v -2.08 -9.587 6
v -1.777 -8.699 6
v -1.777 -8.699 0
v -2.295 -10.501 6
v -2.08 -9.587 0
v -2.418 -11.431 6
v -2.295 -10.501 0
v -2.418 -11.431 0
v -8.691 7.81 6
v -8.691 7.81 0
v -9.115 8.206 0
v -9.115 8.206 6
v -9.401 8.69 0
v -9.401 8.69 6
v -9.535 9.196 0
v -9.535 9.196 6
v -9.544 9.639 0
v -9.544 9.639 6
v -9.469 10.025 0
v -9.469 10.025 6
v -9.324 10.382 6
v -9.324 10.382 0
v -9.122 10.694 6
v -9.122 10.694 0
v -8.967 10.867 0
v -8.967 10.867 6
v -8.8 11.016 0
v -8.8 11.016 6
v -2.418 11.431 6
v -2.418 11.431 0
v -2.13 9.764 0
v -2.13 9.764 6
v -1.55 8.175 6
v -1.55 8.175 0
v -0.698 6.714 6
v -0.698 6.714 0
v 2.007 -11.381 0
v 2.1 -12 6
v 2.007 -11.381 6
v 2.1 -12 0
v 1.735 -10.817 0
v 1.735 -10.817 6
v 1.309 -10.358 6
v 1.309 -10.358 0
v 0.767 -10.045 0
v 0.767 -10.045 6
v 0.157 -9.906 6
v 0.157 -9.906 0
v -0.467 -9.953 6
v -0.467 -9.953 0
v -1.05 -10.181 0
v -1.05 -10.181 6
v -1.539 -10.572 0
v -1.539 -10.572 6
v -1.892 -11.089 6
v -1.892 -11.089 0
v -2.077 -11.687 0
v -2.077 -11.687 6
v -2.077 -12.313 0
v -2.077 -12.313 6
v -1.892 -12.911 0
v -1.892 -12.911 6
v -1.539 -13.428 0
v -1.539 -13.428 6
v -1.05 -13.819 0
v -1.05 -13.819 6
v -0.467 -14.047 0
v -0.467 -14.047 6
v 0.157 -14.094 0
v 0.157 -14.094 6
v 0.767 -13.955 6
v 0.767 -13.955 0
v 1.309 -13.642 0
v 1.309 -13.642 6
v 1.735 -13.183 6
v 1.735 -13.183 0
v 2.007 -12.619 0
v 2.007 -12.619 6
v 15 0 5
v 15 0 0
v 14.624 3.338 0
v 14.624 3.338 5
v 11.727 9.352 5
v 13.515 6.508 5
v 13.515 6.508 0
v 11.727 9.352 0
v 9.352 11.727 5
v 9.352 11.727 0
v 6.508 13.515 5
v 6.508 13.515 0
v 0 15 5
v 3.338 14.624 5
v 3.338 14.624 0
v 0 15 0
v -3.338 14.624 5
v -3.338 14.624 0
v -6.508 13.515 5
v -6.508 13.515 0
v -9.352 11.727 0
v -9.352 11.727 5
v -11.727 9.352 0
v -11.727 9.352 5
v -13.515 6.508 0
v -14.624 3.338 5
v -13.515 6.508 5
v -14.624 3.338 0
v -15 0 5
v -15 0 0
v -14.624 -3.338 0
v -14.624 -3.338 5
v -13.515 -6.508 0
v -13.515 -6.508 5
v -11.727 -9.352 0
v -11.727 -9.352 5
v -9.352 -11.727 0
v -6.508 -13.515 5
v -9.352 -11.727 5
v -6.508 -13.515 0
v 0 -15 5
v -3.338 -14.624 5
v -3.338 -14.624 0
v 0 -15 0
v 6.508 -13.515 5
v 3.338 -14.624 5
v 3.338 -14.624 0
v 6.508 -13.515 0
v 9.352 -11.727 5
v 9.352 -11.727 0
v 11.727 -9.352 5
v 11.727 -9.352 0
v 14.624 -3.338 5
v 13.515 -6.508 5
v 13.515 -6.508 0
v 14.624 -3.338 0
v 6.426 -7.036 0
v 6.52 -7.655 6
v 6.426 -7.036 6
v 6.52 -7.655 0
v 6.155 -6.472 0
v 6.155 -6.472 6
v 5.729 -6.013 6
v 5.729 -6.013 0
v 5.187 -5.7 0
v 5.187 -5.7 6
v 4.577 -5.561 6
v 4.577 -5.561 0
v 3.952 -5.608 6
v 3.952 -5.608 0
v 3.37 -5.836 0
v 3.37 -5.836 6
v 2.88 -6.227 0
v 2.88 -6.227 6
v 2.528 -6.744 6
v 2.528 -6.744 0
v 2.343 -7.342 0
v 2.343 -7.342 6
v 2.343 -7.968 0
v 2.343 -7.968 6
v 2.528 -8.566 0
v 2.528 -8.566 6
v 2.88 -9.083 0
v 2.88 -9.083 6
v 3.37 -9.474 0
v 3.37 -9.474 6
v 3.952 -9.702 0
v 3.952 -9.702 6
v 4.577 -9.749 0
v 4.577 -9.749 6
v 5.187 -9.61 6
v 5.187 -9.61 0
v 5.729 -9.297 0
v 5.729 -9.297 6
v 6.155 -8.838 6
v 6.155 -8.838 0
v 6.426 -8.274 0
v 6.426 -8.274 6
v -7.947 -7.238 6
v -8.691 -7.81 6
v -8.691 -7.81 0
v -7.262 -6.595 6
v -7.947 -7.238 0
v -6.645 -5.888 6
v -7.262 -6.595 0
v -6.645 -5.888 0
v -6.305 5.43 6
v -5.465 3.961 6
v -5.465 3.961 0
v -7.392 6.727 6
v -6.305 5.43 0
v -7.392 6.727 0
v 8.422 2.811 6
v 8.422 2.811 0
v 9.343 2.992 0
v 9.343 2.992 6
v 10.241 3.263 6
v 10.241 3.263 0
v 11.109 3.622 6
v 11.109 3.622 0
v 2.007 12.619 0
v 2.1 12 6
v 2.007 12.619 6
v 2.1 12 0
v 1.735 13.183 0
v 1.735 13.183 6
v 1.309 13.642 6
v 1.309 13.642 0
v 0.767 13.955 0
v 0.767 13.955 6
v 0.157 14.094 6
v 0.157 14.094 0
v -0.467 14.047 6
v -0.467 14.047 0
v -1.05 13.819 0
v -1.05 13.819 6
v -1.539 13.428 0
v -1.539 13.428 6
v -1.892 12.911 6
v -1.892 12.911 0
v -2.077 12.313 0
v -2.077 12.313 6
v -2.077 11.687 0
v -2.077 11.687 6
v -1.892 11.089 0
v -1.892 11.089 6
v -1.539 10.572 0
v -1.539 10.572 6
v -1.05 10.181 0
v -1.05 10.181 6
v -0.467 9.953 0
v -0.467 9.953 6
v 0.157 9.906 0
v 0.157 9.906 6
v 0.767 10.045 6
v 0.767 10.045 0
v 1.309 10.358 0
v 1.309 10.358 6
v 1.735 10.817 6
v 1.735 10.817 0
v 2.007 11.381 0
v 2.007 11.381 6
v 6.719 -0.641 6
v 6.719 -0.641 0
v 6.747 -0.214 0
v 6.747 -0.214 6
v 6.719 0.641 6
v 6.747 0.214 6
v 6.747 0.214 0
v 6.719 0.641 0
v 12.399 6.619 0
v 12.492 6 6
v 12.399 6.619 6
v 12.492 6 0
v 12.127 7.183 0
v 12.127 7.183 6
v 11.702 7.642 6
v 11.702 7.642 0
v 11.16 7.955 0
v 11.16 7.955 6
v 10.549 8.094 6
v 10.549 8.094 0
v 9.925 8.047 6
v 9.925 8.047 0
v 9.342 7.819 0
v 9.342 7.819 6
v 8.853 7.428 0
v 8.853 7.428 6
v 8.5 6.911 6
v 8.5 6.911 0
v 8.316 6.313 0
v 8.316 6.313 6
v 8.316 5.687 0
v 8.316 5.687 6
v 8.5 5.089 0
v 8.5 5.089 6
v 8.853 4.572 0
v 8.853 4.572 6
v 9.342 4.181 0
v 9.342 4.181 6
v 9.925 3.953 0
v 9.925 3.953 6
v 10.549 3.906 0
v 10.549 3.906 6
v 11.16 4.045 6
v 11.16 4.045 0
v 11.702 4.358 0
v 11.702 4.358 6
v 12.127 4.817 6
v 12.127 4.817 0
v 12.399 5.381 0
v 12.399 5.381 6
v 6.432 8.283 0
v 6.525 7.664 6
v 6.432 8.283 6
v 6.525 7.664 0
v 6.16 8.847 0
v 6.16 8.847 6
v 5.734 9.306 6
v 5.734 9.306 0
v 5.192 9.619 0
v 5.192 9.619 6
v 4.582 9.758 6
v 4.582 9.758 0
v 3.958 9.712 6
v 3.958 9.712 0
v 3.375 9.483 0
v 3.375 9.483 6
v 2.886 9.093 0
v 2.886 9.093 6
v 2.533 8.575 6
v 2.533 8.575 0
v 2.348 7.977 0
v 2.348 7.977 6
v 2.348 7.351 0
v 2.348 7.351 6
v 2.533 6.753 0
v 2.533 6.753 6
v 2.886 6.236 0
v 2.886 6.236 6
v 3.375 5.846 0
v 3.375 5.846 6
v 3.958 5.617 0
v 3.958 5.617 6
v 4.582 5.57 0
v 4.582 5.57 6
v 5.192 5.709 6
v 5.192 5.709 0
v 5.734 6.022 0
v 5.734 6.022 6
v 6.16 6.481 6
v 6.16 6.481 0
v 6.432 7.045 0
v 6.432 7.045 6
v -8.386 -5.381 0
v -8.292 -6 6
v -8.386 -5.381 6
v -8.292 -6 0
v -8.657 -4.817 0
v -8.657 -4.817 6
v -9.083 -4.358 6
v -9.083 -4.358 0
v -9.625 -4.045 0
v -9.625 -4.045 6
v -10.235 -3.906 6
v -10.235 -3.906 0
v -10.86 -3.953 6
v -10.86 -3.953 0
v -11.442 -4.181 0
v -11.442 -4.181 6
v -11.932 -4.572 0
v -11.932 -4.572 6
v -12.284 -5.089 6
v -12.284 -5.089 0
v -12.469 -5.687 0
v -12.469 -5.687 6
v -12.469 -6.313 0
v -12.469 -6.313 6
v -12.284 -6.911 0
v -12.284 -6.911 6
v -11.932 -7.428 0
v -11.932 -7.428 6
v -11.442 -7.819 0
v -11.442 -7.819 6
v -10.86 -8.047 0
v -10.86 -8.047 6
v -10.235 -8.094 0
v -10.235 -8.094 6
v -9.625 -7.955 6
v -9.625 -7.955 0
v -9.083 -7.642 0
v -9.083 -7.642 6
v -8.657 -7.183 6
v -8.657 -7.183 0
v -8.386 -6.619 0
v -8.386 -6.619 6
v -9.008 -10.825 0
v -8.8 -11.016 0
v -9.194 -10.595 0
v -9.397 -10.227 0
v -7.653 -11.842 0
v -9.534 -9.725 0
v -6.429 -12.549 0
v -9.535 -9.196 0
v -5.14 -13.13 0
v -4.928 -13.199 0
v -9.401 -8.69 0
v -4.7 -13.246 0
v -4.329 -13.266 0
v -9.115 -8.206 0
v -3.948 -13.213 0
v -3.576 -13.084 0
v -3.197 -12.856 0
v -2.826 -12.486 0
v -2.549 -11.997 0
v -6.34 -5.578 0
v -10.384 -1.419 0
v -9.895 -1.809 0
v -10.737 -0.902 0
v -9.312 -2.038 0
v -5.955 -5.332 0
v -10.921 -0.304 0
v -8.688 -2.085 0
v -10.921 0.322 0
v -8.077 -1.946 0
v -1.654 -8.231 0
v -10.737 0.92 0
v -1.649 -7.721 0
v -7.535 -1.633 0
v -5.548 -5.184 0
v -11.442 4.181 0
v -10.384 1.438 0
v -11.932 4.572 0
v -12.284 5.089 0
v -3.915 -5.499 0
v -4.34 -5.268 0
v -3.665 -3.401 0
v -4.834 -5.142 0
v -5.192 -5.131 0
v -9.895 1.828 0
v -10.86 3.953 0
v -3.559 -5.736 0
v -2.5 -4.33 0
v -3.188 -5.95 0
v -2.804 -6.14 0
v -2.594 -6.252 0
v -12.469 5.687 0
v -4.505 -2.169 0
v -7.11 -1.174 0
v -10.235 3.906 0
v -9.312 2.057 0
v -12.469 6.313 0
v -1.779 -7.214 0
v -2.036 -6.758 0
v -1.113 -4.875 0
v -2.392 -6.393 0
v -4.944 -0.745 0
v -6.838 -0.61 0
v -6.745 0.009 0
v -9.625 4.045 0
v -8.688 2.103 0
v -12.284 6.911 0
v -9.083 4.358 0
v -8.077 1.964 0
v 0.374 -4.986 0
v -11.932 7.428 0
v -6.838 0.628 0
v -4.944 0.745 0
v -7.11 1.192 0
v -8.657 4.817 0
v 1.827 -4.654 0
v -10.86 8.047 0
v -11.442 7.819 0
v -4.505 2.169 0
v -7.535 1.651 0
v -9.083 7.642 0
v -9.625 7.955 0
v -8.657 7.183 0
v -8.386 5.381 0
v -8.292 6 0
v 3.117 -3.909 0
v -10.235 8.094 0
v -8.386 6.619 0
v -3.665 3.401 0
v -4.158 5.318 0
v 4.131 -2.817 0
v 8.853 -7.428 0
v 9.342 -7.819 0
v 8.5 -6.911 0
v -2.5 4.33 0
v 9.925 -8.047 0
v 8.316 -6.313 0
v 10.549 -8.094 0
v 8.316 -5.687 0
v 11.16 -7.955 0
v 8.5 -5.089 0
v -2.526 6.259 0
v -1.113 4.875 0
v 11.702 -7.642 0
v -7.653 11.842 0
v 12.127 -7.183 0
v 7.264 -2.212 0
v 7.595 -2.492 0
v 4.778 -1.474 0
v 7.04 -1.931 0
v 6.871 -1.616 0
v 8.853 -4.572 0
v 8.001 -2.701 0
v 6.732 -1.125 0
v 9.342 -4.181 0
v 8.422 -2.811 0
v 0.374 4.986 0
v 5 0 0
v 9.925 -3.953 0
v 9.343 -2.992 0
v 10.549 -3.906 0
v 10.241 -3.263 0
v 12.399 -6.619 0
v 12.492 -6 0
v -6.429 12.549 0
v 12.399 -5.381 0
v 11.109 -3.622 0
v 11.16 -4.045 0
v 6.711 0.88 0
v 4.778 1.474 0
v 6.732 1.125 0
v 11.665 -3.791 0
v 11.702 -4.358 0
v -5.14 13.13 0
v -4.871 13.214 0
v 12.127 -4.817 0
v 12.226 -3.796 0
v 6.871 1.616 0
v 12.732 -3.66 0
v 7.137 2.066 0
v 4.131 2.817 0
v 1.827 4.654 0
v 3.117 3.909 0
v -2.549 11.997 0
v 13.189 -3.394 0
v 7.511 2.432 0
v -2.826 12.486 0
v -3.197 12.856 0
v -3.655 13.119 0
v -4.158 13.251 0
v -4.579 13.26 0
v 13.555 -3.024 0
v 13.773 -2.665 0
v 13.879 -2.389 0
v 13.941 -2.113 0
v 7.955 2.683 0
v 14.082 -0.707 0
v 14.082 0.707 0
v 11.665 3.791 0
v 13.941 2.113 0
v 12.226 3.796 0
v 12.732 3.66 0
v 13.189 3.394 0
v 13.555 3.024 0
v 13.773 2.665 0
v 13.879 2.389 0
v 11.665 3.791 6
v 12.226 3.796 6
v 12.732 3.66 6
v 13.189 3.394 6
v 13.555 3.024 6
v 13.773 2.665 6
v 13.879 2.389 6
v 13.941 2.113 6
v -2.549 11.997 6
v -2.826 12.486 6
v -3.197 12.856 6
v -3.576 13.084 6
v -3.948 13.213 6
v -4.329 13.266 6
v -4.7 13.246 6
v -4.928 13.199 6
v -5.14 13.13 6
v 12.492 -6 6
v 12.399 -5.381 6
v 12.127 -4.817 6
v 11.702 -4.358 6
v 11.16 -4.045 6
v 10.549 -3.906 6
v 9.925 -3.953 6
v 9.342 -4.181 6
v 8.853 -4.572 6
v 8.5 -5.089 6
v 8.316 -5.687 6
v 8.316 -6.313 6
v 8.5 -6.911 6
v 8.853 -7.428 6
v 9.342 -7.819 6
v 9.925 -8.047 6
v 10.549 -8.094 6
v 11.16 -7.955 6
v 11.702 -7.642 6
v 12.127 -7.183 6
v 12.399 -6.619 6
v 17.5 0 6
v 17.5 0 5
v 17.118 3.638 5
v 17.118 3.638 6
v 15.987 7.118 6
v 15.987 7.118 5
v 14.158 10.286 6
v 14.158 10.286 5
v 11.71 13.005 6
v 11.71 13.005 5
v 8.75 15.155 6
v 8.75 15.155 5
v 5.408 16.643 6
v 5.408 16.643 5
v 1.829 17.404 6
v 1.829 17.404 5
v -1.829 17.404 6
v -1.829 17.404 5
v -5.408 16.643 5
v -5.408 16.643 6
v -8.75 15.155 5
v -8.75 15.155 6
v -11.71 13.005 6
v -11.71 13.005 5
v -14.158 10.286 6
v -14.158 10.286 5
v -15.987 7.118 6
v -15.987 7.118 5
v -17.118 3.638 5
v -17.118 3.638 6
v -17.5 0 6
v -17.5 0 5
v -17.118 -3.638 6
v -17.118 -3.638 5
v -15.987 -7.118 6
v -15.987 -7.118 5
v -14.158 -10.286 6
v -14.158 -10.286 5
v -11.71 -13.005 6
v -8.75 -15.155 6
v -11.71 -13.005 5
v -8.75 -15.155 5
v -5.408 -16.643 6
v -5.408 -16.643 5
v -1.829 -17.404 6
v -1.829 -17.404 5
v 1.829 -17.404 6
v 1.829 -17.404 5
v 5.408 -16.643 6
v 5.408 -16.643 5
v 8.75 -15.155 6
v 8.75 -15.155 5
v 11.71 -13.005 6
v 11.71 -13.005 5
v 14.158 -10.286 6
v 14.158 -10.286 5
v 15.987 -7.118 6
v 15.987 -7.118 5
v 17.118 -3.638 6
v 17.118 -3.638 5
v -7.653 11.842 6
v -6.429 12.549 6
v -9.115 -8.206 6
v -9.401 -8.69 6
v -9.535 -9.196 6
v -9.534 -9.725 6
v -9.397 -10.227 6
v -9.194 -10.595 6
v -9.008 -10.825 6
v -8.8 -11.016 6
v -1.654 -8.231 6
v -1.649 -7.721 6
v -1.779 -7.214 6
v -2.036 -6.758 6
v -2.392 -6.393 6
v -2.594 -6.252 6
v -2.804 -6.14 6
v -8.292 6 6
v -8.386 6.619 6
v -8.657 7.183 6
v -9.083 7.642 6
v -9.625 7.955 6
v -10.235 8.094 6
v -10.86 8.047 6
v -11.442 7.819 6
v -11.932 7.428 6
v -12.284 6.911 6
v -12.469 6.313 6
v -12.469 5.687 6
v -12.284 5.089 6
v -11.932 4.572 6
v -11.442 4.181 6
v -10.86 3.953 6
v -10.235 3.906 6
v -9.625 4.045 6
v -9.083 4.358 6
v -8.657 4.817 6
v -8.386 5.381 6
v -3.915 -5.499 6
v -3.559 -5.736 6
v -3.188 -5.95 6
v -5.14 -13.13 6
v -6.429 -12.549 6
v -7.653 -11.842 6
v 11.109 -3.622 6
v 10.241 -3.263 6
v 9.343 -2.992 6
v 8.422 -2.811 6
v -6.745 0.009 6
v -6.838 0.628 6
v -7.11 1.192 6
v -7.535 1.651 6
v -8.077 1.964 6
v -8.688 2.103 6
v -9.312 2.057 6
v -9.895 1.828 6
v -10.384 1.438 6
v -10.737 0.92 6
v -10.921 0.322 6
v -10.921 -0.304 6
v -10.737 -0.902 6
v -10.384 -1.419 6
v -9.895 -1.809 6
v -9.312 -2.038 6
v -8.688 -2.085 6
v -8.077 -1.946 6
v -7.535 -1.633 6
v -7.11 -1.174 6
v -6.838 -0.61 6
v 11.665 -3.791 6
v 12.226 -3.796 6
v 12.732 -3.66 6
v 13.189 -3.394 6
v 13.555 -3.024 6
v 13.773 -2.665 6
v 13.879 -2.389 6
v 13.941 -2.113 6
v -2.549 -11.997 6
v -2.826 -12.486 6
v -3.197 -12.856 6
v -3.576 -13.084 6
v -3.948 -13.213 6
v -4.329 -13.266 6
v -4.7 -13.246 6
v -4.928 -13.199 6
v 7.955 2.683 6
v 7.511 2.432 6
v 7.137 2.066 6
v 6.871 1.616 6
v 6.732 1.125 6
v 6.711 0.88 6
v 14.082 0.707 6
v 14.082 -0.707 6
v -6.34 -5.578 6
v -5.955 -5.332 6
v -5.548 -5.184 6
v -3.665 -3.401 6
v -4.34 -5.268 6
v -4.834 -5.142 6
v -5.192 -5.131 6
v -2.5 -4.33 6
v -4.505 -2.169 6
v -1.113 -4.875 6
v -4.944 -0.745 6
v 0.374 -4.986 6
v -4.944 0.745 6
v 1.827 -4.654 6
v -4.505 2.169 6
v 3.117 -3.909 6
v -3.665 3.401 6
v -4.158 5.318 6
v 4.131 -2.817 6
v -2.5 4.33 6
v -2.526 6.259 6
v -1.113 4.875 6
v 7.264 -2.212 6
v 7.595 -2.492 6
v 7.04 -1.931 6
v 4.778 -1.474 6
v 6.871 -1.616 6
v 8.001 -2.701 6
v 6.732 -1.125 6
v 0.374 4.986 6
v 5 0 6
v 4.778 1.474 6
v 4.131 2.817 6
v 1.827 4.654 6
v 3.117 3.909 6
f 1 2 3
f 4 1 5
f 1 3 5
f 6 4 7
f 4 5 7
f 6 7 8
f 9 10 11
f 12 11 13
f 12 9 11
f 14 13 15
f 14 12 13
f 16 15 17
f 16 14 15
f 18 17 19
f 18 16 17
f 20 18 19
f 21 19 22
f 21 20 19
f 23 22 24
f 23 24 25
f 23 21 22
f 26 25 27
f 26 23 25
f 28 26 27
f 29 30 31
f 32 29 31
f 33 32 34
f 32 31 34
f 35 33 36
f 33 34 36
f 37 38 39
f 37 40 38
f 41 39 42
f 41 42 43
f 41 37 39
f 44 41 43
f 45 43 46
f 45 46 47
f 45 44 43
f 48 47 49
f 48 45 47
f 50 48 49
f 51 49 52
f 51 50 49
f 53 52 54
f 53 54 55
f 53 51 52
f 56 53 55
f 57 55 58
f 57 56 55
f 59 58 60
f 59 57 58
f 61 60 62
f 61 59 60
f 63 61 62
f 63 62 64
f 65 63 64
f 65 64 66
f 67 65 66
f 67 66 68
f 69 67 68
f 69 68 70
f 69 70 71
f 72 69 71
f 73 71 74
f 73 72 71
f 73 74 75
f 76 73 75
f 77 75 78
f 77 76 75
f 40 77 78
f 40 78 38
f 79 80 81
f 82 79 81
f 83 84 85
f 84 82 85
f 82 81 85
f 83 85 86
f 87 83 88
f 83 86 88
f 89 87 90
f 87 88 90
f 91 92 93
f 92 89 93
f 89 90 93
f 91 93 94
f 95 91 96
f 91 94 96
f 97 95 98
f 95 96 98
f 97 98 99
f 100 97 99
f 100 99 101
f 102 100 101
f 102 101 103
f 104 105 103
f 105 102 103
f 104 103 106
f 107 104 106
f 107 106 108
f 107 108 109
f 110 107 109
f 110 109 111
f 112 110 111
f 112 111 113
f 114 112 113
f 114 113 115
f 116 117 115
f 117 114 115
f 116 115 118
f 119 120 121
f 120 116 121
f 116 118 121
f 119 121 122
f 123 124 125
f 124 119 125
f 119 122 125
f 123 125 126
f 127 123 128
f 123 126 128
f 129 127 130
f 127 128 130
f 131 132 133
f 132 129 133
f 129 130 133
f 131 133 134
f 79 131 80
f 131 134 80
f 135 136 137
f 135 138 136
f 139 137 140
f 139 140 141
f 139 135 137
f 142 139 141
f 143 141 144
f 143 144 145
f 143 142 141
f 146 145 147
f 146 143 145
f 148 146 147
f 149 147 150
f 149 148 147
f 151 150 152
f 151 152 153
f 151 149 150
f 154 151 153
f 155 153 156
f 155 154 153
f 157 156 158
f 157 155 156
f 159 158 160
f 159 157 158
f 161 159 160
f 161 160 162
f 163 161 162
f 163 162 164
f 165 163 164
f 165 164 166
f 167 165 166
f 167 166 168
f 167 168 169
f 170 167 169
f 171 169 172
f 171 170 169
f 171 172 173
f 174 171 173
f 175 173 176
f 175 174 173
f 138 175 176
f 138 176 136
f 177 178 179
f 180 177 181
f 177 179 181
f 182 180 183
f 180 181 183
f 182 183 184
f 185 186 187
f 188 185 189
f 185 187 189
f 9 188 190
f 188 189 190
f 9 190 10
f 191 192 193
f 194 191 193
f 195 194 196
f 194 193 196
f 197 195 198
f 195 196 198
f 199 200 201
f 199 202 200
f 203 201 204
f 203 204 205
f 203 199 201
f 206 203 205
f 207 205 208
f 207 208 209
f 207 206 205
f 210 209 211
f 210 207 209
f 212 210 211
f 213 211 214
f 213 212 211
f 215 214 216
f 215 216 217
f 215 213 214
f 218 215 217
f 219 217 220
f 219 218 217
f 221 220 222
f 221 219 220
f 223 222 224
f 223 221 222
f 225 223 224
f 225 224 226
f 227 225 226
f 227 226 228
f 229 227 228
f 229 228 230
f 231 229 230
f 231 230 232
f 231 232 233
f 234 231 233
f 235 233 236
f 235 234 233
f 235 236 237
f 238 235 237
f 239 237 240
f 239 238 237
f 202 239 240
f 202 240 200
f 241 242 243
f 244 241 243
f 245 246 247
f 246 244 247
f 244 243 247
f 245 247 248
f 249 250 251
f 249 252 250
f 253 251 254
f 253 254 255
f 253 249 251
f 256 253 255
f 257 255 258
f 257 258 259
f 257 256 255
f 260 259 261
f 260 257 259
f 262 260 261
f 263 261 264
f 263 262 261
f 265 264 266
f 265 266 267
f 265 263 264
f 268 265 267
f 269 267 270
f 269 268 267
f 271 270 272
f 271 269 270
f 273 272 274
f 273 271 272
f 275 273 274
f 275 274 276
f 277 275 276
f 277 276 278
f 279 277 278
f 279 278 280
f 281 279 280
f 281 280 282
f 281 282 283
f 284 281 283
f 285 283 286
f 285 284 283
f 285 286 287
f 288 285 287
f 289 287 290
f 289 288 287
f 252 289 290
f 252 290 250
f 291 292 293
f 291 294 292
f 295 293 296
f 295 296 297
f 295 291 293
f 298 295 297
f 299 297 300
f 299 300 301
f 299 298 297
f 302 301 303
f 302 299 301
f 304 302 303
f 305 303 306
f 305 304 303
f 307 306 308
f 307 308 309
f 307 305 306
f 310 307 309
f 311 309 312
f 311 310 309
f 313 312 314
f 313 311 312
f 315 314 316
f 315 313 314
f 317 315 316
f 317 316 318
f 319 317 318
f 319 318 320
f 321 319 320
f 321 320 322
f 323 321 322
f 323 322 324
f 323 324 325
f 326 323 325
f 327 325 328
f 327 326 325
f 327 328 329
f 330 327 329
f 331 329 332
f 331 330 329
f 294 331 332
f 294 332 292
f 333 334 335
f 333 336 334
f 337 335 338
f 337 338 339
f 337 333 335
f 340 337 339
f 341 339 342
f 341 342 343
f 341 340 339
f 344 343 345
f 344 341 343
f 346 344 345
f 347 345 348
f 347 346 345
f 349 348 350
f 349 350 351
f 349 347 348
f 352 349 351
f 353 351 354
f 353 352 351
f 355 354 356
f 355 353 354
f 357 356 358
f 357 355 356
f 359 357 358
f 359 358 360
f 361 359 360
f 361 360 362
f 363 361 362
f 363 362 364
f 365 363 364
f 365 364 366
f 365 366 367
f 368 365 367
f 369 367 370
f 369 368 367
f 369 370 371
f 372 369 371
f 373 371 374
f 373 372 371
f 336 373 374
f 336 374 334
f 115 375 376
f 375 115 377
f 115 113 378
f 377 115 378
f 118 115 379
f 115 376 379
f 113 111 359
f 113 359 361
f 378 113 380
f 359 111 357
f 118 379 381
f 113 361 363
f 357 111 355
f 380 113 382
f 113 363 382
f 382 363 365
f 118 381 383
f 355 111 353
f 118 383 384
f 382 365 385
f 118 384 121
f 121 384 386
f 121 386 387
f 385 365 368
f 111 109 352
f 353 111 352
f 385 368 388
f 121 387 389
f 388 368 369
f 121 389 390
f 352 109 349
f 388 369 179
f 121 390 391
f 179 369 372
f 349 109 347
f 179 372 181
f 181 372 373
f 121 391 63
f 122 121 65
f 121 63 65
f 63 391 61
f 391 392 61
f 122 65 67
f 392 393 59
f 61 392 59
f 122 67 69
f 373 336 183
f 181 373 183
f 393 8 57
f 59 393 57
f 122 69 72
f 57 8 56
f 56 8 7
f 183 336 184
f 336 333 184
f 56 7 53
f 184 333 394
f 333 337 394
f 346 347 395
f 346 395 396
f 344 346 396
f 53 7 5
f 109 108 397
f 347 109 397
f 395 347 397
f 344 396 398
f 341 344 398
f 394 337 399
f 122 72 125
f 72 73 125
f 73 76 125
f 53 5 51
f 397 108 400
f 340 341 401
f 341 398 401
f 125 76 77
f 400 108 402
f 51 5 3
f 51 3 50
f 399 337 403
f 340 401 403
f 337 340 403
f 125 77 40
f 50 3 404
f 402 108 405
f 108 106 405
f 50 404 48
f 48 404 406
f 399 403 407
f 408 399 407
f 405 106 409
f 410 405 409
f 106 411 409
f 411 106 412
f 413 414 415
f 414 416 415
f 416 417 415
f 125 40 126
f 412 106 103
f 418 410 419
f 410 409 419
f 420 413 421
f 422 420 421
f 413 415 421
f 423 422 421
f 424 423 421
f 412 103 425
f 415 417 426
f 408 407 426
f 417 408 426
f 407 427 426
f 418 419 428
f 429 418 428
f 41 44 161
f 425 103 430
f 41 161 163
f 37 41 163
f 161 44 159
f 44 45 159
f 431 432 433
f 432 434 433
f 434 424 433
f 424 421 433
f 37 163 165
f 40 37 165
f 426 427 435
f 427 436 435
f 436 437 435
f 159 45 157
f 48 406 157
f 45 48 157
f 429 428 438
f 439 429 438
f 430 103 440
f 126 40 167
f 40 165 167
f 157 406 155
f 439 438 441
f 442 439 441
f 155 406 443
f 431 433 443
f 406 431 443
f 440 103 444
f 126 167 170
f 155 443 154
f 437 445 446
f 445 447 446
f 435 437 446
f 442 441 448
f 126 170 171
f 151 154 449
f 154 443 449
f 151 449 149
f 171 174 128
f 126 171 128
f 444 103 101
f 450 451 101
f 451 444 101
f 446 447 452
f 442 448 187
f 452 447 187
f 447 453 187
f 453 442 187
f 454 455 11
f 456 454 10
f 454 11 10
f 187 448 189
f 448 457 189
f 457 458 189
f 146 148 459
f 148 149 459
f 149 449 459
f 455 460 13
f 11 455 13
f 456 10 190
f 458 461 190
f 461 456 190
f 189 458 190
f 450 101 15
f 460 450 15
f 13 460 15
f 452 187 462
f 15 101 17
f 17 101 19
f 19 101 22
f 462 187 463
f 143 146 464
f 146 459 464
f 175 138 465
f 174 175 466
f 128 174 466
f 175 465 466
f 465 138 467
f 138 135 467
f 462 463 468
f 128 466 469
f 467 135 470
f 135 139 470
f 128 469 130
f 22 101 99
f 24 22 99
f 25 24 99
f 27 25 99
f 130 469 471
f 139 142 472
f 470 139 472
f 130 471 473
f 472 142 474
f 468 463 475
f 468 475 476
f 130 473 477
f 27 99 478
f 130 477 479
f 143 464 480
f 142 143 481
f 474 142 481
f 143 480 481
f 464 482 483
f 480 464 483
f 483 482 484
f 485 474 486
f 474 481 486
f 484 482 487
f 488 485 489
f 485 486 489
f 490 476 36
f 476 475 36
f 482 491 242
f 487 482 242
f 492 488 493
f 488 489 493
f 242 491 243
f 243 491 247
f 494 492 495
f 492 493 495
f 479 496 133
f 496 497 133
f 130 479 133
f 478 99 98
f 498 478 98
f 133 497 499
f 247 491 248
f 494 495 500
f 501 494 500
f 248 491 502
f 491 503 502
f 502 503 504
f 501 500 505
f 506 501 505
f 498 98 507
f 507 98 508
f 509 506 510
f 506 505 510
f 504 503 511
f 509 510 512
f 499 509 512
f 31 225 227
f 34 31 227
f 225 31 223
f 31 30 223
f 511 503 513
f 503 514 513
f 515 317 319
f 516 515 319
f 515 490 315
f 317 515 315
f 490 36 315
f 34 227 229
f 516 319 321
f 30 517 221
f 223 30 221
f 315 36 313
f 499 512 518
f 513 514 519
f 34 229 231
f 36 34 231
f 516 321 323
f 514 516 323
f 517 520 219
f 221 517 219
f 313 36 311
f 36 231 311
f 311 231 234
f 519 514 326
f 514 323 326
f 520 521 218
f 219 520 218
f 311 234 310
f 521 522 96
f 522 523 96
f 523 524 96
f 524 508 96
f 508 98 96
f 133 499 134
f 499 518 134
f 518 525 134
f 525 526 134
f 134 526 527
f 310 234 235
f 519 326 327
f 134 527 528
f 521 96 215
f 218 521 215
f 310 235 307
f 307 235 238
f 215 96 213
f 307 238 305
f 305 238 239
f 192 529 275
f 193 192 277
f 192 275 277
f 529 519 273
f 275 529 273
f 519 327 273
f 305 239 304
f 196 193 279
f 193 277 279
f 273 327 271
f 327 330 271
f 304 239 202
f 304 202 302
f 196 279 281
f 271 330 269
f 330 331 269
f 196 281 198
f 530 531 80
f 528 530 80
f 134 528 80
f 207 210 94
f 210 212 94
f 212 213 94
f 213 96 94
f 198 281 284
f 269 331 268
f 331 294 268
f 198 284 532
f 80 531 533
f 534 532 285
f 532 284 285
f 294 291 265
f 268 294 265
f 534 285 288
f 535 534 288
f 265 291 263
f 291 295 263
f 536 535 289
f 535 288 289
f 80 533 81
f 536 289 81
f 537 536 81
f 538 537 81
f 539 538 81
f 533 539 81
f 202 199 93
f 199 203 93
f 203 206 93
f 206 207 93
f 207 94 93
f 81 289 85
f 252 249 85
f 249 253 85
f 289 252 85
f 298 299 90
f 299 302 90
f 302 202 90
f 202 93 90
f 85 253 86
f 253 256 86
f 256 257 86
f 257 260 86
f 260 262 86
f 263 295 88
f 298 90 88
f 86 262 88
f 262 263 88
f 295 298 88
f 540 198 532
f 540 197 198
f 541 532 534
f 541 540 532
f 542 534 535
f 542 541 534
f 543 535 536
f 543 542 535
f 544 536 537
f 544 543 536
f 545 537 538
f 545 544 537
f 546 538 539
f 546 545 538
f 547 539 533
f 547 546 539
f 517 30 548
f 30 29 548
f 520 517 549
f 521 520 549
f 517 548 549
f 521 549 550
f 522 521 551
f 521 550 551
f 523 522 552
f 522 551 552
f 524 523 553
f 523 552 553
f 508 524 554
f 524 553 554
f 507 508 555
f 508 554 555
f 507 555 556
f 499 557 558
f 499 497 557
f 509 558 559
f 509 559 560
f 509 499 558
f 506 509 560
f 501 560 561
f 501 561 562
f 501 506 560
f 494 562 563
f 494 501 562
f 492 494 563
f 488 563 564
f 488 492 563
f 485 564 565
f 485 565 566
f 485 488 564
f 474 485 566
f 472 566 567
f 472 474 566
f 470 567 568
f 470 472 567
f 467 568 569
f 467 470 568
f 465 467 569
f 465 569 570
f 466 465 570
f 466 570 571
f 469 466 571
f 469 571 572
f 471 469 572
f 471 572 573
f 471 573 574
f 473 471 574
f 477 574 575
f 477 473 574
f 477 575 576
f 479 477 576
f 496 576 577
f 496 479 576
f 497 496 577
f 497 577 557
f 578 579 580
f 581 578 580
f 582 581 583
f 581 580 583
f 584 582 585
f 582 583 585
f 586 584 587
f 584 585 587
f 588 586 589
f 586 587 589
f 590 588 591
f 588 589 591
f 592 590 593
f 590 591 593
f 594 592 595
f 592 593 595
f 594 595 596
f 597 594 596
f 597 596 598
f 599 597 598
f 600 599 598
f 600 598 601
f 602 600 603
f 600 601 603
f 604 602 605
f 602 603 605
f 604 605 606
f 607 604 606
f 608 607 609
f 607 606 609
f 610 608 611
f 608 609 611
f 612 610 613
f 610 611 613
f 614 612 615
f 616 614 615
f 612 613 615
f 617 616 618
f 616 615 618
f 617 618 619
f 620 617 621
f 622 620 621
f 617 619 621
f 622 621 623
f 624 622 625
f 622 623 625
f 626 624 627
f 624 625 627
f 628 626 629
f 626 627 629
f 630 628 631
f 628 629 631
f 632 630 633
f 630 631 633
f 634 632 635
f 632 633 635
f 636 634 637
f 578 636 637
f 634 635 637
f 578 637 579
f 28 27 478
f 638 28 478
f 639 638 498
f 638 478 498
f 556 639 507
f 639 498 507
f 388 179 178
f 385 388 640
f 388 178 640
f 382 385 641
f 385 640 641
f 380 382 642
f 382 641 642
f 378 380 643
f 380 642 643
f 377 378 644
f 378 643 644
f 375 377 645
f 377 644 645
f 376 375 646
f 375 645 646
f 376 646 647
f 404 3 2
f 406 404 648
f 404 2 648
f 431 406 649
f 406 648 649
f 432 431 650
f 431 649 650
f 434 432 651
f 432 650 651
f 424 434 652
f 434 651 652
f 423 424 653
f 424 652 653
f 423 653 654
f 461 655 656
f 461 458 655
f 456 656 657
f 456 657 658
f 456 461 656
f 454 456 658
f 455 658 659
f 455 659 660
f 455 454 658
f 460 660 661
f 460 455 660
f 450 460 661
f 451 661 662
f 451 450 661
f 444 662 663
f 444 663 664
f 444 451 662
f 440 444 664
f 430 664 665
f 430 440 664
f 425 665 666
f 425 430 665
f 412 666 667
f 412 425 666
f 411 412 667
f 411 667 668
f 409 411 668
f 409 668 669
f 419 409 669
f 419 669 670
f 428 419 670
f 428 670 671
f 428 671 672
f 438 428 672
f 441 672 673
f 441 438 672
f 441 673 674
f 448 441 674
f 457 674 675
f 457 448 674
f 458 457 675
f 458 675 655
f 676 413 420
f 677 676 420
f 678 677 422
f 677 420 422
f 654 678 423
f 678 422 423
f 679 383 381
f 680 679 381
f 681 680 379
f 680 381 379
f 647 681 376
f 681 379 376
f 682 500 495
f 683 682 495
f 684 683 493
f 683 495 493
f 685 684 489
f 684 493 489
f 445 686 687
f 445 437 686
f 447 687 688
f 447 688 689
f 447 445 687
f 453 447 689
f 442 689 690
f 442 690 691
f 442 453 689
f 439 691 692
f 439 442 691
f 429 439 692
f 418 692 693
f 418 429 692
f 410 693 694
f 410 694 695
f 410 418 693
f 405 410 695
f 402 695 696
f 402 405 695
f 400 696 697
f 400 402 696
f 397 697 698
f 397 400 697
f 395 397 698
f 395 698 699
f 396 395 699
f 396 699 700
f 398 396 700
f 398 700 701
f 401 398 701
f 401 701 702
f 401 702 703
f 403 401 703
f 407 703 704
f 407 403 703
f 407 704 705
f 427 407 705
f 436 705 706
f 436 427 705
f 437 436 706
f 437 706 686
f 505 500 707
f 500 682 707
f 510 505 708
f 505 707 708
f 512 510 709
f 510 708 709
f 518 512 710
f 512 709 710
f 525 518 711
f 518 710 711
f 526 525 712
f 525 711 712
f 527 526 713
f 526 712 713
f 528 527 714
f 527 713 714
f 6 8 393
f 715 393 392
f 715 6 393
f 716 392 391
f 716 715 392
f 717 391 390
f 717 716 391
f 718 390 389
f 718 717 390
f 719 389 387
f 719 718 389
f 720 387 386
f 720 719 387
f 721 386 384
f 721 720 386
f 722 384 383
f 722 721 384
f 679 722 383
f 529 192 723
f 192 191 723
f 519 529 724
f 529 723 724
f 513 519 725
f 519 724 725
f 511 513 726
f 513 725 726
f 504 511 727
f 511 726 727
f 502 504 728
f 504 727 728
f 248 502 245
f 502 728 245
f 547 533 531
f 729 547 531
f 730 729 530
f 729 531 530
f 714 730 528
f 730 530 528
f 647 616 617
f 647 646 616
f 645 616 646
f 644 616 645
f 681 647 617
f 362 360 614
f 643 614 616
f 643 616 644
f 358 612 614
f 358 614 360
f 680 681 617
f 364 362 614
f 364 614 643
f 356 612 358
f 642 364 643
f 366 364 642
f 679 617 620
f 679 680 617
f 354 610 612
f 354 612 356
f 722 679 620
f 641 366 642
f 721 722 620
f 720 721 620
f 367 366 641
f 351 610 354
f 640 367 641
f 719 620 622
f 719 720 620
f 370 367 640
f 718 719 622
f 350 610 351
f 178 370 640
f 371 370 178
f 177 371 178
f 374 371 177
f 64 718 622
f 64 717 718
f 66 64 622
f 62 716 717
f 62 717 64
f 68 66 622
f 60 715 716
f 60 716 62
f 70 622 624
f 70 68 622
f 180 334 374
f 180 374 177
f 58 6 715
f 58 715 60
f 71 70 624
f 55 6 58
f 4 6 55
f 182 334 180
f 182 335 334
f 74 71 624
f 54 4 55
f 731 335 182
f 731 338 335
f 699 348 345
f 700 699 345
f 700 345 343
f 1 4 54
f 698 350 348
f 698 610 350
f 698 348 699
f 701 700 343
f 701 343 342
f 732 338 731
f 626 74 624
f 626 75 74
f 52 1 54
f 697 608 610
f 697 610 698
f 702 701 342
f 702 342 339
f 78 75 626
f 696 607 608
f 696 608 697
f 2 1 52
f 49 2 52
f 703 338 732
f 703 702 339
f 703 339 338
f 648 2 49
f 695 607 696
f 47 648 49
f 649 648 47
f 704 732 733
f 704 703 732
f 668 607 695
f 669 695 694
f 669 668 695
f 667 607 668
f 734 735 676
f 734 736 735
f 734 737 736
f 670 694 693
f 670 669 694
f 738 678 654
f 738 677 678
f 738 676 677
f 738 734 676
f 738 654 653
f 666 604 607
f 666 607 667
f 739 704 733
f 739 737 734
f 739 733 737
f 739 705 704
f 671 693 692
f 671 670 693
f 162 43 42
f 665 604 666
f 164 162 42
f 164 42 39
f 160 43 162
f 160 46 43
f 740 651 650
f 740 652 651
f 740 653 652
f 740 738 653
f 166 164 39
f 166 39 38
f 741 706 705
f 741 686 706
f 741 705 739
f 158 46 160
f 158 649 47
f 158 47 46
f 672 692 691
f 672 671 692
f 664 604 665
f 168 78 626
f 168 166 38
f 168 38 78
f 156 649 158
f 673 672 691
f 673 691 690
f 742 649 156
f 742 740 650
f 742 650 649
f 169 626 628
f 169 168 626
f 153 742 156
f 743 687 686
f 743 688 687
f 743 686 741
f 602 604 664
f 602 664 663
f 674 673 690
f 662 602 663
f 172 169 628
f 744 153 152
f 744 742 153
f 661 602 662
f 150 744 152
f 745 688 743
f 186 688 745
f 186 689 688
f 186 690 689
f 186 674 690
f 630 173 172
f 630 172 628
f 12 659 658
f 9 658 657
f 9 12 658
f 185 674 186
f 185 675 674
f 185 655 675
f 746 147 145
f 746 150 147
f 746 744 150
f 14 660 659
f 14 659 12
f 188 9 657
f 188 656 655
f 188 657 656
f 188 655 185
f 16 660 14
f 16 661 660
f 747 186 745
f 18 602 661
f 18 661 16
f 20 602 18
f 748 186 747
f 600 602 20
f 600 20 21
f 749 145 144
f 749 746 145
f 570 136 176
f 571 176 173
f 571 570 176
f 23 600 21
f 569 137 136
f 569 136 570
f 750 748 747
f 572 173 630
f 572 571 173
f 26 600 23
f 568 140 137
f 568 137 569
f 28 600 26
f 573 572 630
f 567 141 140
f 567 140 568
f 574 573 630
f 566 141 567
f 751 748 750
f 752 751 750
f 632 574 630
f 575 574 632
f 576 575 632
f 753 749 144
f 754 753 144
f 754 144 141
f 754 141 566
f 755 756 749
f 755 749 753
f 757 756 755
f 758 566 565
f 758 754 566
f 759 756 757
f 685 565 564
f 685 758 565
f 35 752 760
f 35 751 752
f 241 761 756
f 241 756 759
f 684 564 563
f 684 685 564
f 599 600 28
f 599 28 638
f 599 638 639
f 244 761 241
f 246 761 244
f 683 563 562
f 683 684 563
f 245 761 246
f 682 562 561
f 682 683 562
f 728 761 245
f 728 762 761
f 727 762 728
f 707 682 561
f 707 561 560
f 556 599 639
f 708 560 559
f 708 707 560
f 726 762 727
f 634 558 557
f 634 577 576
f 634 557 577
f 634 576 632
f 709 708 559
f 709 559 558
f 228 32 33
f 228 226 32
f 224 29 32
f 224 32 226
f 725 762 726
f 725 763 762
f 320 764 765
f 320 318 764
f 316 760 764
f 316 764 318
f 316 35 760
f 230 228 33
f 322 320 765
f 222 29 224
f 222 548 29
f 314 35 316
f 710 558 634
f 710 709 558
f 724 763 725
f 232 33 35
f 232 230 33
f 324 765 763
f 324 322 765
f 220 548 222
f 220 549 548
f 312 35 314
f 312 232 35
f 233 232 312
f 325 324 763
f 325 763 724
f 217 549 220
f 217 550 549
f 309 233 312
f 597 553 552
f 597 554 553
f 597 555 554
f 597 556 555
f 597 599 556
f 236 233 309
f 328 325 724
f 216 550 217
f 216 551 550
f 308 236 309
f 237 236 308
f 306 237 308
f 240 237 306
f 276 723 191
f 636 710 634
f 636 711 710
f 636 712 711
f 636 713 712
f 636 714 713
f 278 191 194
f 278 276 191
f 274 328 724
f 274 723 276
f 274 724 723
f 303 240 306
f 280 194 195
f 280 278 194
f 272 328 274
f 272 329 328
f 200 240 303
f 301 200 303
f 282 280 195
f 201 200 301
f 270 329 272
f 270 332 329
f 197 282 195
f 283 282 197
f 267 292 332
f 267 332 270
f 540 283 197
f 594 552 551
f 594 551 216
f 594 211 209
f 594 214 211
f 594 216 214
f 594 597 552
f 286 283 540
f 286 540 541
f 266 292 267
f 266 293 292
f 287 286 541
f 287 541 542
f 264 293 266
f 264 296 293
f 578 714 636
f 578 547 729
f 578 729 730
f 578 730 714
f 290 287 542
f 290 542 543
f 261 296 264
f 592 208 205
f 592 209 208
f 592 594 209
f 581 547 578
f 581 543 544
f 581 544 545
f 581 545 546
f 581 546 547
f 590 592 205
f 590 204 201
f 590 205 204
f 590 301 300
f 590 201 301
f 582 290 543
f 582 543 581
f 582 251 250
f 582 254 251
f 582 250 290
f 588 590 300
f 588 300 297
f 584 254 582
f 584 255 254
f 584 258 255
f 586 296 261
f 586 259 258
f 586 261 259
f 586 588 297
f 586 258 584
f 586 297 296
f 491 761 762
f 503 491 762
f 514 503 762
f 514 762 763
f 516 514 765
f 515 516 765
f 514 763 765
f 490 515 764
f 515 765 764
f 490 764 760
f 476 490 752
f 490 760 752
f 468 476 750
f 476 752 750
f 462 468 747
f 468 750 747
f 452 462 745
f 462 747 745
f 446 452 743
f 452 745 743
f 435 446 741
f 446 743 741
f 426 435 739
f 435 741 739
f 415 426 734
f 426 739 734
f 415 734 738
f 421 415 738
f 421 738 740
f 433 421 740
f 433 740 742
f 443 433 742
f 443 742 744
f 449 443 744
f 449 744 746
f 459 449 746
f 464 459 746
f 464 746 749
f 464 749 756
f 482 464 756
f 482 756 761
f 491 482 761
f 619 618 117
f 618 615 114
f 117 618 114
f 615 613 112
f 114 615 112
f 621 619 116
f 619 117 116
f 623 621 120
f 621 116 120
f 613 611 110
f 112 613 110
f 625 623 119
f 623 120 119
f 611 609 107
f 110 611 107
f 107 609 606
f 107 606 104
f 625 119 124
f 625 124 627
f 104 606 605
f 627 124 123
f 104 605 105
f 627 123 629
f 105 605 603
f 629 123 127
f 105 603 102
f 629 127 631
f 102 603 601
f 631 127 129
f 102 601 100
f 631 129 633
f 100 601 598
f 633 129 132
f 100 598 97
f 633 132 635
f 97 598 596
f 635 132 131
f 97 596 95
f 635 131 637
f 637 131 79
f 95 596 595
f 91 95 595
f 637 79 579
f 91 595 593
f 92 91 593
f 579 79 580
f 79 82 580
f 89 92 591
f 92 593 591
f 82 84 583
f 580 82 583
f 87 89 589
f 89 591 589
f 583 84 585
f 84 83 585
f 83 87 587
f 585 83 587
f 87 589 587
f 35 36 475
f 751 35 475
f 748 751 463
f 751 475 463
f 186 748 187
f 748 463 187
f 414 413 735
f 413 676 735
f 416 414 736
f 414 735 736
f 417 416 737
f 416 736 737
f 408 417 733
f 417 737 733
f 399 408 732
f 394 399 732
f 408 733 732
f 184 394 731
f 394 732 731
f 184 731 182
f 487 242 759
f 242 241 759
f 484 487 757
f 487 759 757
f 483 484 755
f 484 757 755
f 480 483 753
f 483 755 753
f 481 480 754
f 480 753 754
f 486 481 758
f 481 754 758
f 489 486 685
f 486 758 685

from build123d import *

# Parameters (mm, degrees)
SKETCH_1_R          = 15
SKETCH_1_R_2        = 2.1
EXTRUDE_1_DEPTH     = 6
EXTRUDE_START       = -1
SKETCH_2_R          = 17.5
SKETCH_2_R_2        = 2.1
EXTRUDE_2_DEPTH     = 1
SKETCH_3_R          = 5
CUT_EXTRUDE_1_DEPTH = 10
CUT_EXTRUDE_3_DEPTH = 10
FILLET_1_R          = 2


with BuildPart() as part:
    # 草图1 → 凸台-拉伸1 (new body)
    with BuildSketch(Plane.XY):
        Circle(SKETCH_1_R)
        with Locations((0, 12)):
            Circle(SKETCH_1_R_2, mode=Mode.SUBTRACT)
        with Locations((10.392304845, 6)):
            Circle(SKETCH_1_R_2, mode=Mode.SUBTRACT)
        with Locations((10.392304845, -6)):
            Circle(SKETCH_1_R_2, mode=Mode.SUBTRACT)
        with Locations((0, -12)):
            Circle(SKETCH_1_R_2, mode=Mode.SUBTRACT)
        with Locations((-10.392304845, -6)):
            Circle(SKETCH_1_R_2, mode=Mode.SUBTRACT)
        with Locations((-10.392304845, 6)):
            Circle(SKETCH_1_R_2, mode=Mode.SUBTRACT)
        with Locations((4.425, 7.664324823)):
            Circle(SKETCH_1_R_2, mode=Mode.SUBTRACT)
        with Locations((4.419693866, -7.655134331)):
            Circle(SKETCH_1_R_2, mode=Mode.SUBTRACT)
        with Locations((-8.844693866, 0.009190493)):
            Circle(SKETCH_1_R_2, mode=Mode.SUBTRACT)
    extrude(amount=EXTRUDE_1_DEPTH)

    # 草图2 → 凸台-拉伸2 (add)
    with BuildSketch(Plane.XY.offset(6).offset(EXTRUDE_START)):
        Circle(SKETCH_2_R)
        with Locations((-8.844693866, 0.009190493)):
            Circle(SKETCH_2_R_2, mode=Mode.SUBTRACT)
        with Locations((-10.392304845, -6)):
            Circle(SKETCH_2_R_2, mode=Mode.SUBTRACT)
        with Locations((0, -12)):
            Circle(SKETCH_2_R_2, mode=Mode.SUBTRACT)
        with Locations((4.419693866, -7.655134331)):
            Circle(SKETCH_2_R_2, mode=Mode.SUBTRACT)
        with Locations((10.392304845, -6)):
            Circle(SKETCH_2_R_2, mode=Mode.SUBTRACT)
        with Locations((10.392304845, 6)):
            Circle(SKETCH_2_R_2, mode=Mode.SUBTRACT)
        with Locations((4.425, 7.664324823)):
            Circle(SKETCH_2_R_2, mode=Mode.SUBTRACT)
        with Locations((0, 12)):
            Circle(SKETCH_2_R_2, mode=Mode.SUBTRACT)
        with Locations((-10.392304845, 6)):
            Circle(SKETCH_2_R_2, mode=Mode.SUBTRACT)
    extrude(amount=EXTRUDE_2_DEPTH)

    # 草图3 → 切除-拉伸1 (cut)
    with BuildSketch(Plane.XY.offset(6)):
        Circle(SKETCH_3_R)
    extrude(amount=-CUT_EXTRUDE_1_DEPTH, mode=Mode.SUBTRACT)

    # 草图4 → 切除-拉伸3 (cut)
    with BuildSketch(Plane(origin=(0, 0, 0), x_dir=(-1, 0, 0), z_dir=(0, 0, -1))):
        with BuildLine():
            ThreePointArc((5.465336879, 3.961387736), (7.679309109, 7.001766097), (10.89964539, 8.94470404))
            ThreePointArc((10.89964539, 8.94470404), (7.05, 12.210958193), (2.296518233, 13.91172182))
            ThreePointArc((2.296518233, 13.91172182), (2.224052757, 10.151359821), (0.697993974, 6.713814446))
            ThreePointArc((0.697993974, 6.713814446), (3.375, 5.845671476), (5.465336879, 3.961387736))
        make_face()
        with BuildLine():
            ThreePointArc((2.296518233, -13.91172182), (7.05, -12.210958193), (10.89964539, -8.94470404))
            ThreePointArc((10.89964539, -8.94470404), (7.679309109, -7.001766097), (5.465336879, -3.961387736))
            ThreePointArc((5.465336879, -3.961387736), (3.375, -5.845671476), (0.697993974, -6.713814446))
            ThreePointArc((0.697993974, -6.713814446), (2.224052757, -10.151359821), (2.296518233, -13.91172182))
        make_face()
        with BuildLine():
            ThreePointArc((-6.163330853, 2.75242671), (-9.903361866, 3.149593723), (-13.196163623, 4.96701778))
            ThreePointArc((-13.196163623, 4.96701778), (-14.1, 0), (-13.196163623, -4.96701778))
            ThreePointArc((-13.196163623, -4.96701778), (-9.903361866, -3.149593723), (-6.163330853, -2.75242671))
            ThreePointArc((-6.163330853, -2.75242671), (-6.75, 0), (-6.163330853, 2.75242671))
        make_face()
    extrude(amount=-CUT_EXTRUDE_3_DEPTH, mode=Mode.SUBTRACT)

    # 圆角1
    fillet_1_edges = [part.edges().sort_by_distance(p)[0] for p in [
        (-10.89964539, 8.94470404, 3),
        (-2.296518233, 13.91172182, 3),
        (-2.296518233, -13.91172182, 3),
        (-0.697993974, -6.713814446, 3),
        (-5.465336879, -3.961387736, 3),
        (-10.89964539, -8.94470404, 3),
        (6.163330853, -2.75242671, 3),
        (13.196163623, -4.96701778, 3),
        (13.196163623, 4.96701778, 3),
        (6.163330853, 2.75242671, 3),
    ]]
    fillet(fillet_1_edges, radius=FILLET_1_R)


solid = part.part
